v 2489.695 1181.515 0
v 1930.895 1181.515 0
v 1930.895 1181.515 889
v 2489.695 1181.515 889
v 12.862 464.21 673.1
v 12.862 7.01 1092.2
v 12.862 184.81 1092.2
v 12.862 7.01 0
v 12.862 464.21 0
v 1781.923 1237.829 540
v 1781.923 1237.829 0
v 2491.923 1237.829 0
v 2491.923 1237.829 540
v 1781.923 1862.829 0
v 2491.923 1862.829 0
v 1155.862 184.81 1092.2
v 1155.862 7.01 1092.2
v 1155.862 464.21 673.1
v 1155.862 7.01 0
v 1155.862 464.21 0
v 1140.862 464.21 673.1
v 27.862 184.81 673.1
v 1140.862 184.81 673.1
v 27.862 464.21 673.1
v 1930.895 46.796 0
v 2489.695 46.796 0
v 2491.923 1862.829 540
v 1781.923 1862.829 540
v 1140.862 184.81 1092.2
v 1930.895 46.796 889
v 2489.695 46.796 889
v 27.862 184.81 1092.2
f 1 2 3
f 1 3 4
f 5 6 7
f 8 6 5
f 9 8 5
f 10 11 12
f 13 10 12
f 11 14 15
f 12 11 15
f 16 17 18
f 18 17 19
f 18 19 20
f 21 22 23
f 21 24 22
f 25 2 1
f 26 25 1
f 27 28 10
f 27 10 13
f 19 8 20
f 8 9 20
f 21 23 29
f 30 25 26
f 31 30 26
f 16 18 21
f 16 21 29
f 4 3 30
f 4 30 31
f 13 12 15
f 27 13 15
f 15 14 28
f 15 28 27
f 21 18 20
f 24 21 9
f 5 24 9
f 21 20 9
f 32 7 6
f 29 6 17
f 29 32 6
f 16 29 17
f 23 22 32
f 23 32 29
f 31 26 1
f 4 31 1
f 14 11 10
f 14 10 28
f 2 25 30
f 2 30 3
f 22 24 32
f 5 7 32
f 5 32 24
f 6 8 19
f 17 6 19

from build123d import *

# Parameters (mm, degrees)
F0_W     = 558.8
F0_H     = 1134.719407
F1_DEPTH = 889
F2_DEPTH = 673.1
F3_W     = 1143
F3_H     = 177.8
F4_DEPTH = 419.1
F6_DEPTH = 15
F8_DEPTH = 15
F0_W_2   = 710
F0_H_2   = 625
F9_DEPTH = 540


with BuildPart() as f1:
    # F0 (on Top) → F1 (new body)
    with BuildSketch(Plane.XY):
        with Locations((2210.294613, 614.155255)):
            Rectangle(F0_W, F0_H)
    extrude(amount=F1_DEPTH)


with BuildPart() as f2:
    # F0 (on Top) → F2 (new body)
    with BuildSketch(Plane.XY):
        Polygon((12.861629, 464.210095), (12.861629, 7.010095), (1117, 7.010095), (1155.861629, 7.010095), (1155.861629, 464.210095), align=None)
    extrude(amount=F2_DEPTH)

    # F3 (on face) → F4 (join)
    with BuildSketch(Plane.XY.offset(673.1)):
        with Locations((584.361629, 95.910095)):
            Rectangle(F3_W, F3_H)
    extrude(amount=F4_DEPTH)

    # F5 (on face) → F6 (join)
    with BuildSketch(Plane.YZ.offset(1155.861629)):
        Polygon((184.810095, 673.1), (184.810095, 1092.2), (7.010095, 1092.2), (7.010095, 0), (464.210095, 0), (464.210095, 673.1), align=None)
        Polygon((464.210095, 673.1), (184.810095, 1092.2), (184.810095, 673.1), align=None)
    extrude(amount=-F6_DEPTH)

    # F7 (on face) → F8 (join)
    with BuildSketch(Plane(origin=(12.861629, 0, 0), x_dir=(0, -1, 0), z_dir=(-1, 0, 0))):
        Polygon((-184.810095, 673.1), (-464.210095, 673.1), (-464.210095, 0), (-7.010095, 0), (-7.010095, 1092.2), (-184.810095, 1092.2), align=None)
        Polygon((-184.810095, 1092.2), (-464.210095, 673.1), (-184.810095, 673.1), align=None)
    extrude(amount=-F8_DEPTH)


with BuildPart() as f9:
    # F0 (on Top) → F9 (new body)
    with BuildSketch(Plane.XY):
        with Locations((2136.922698, 1550.328672)):
            Rectangle(F0_W_2, F0_H_2)
    extrude(amount=F9_DEPTH)


solid = Compound([f1.part, f2.part, f9.part])
